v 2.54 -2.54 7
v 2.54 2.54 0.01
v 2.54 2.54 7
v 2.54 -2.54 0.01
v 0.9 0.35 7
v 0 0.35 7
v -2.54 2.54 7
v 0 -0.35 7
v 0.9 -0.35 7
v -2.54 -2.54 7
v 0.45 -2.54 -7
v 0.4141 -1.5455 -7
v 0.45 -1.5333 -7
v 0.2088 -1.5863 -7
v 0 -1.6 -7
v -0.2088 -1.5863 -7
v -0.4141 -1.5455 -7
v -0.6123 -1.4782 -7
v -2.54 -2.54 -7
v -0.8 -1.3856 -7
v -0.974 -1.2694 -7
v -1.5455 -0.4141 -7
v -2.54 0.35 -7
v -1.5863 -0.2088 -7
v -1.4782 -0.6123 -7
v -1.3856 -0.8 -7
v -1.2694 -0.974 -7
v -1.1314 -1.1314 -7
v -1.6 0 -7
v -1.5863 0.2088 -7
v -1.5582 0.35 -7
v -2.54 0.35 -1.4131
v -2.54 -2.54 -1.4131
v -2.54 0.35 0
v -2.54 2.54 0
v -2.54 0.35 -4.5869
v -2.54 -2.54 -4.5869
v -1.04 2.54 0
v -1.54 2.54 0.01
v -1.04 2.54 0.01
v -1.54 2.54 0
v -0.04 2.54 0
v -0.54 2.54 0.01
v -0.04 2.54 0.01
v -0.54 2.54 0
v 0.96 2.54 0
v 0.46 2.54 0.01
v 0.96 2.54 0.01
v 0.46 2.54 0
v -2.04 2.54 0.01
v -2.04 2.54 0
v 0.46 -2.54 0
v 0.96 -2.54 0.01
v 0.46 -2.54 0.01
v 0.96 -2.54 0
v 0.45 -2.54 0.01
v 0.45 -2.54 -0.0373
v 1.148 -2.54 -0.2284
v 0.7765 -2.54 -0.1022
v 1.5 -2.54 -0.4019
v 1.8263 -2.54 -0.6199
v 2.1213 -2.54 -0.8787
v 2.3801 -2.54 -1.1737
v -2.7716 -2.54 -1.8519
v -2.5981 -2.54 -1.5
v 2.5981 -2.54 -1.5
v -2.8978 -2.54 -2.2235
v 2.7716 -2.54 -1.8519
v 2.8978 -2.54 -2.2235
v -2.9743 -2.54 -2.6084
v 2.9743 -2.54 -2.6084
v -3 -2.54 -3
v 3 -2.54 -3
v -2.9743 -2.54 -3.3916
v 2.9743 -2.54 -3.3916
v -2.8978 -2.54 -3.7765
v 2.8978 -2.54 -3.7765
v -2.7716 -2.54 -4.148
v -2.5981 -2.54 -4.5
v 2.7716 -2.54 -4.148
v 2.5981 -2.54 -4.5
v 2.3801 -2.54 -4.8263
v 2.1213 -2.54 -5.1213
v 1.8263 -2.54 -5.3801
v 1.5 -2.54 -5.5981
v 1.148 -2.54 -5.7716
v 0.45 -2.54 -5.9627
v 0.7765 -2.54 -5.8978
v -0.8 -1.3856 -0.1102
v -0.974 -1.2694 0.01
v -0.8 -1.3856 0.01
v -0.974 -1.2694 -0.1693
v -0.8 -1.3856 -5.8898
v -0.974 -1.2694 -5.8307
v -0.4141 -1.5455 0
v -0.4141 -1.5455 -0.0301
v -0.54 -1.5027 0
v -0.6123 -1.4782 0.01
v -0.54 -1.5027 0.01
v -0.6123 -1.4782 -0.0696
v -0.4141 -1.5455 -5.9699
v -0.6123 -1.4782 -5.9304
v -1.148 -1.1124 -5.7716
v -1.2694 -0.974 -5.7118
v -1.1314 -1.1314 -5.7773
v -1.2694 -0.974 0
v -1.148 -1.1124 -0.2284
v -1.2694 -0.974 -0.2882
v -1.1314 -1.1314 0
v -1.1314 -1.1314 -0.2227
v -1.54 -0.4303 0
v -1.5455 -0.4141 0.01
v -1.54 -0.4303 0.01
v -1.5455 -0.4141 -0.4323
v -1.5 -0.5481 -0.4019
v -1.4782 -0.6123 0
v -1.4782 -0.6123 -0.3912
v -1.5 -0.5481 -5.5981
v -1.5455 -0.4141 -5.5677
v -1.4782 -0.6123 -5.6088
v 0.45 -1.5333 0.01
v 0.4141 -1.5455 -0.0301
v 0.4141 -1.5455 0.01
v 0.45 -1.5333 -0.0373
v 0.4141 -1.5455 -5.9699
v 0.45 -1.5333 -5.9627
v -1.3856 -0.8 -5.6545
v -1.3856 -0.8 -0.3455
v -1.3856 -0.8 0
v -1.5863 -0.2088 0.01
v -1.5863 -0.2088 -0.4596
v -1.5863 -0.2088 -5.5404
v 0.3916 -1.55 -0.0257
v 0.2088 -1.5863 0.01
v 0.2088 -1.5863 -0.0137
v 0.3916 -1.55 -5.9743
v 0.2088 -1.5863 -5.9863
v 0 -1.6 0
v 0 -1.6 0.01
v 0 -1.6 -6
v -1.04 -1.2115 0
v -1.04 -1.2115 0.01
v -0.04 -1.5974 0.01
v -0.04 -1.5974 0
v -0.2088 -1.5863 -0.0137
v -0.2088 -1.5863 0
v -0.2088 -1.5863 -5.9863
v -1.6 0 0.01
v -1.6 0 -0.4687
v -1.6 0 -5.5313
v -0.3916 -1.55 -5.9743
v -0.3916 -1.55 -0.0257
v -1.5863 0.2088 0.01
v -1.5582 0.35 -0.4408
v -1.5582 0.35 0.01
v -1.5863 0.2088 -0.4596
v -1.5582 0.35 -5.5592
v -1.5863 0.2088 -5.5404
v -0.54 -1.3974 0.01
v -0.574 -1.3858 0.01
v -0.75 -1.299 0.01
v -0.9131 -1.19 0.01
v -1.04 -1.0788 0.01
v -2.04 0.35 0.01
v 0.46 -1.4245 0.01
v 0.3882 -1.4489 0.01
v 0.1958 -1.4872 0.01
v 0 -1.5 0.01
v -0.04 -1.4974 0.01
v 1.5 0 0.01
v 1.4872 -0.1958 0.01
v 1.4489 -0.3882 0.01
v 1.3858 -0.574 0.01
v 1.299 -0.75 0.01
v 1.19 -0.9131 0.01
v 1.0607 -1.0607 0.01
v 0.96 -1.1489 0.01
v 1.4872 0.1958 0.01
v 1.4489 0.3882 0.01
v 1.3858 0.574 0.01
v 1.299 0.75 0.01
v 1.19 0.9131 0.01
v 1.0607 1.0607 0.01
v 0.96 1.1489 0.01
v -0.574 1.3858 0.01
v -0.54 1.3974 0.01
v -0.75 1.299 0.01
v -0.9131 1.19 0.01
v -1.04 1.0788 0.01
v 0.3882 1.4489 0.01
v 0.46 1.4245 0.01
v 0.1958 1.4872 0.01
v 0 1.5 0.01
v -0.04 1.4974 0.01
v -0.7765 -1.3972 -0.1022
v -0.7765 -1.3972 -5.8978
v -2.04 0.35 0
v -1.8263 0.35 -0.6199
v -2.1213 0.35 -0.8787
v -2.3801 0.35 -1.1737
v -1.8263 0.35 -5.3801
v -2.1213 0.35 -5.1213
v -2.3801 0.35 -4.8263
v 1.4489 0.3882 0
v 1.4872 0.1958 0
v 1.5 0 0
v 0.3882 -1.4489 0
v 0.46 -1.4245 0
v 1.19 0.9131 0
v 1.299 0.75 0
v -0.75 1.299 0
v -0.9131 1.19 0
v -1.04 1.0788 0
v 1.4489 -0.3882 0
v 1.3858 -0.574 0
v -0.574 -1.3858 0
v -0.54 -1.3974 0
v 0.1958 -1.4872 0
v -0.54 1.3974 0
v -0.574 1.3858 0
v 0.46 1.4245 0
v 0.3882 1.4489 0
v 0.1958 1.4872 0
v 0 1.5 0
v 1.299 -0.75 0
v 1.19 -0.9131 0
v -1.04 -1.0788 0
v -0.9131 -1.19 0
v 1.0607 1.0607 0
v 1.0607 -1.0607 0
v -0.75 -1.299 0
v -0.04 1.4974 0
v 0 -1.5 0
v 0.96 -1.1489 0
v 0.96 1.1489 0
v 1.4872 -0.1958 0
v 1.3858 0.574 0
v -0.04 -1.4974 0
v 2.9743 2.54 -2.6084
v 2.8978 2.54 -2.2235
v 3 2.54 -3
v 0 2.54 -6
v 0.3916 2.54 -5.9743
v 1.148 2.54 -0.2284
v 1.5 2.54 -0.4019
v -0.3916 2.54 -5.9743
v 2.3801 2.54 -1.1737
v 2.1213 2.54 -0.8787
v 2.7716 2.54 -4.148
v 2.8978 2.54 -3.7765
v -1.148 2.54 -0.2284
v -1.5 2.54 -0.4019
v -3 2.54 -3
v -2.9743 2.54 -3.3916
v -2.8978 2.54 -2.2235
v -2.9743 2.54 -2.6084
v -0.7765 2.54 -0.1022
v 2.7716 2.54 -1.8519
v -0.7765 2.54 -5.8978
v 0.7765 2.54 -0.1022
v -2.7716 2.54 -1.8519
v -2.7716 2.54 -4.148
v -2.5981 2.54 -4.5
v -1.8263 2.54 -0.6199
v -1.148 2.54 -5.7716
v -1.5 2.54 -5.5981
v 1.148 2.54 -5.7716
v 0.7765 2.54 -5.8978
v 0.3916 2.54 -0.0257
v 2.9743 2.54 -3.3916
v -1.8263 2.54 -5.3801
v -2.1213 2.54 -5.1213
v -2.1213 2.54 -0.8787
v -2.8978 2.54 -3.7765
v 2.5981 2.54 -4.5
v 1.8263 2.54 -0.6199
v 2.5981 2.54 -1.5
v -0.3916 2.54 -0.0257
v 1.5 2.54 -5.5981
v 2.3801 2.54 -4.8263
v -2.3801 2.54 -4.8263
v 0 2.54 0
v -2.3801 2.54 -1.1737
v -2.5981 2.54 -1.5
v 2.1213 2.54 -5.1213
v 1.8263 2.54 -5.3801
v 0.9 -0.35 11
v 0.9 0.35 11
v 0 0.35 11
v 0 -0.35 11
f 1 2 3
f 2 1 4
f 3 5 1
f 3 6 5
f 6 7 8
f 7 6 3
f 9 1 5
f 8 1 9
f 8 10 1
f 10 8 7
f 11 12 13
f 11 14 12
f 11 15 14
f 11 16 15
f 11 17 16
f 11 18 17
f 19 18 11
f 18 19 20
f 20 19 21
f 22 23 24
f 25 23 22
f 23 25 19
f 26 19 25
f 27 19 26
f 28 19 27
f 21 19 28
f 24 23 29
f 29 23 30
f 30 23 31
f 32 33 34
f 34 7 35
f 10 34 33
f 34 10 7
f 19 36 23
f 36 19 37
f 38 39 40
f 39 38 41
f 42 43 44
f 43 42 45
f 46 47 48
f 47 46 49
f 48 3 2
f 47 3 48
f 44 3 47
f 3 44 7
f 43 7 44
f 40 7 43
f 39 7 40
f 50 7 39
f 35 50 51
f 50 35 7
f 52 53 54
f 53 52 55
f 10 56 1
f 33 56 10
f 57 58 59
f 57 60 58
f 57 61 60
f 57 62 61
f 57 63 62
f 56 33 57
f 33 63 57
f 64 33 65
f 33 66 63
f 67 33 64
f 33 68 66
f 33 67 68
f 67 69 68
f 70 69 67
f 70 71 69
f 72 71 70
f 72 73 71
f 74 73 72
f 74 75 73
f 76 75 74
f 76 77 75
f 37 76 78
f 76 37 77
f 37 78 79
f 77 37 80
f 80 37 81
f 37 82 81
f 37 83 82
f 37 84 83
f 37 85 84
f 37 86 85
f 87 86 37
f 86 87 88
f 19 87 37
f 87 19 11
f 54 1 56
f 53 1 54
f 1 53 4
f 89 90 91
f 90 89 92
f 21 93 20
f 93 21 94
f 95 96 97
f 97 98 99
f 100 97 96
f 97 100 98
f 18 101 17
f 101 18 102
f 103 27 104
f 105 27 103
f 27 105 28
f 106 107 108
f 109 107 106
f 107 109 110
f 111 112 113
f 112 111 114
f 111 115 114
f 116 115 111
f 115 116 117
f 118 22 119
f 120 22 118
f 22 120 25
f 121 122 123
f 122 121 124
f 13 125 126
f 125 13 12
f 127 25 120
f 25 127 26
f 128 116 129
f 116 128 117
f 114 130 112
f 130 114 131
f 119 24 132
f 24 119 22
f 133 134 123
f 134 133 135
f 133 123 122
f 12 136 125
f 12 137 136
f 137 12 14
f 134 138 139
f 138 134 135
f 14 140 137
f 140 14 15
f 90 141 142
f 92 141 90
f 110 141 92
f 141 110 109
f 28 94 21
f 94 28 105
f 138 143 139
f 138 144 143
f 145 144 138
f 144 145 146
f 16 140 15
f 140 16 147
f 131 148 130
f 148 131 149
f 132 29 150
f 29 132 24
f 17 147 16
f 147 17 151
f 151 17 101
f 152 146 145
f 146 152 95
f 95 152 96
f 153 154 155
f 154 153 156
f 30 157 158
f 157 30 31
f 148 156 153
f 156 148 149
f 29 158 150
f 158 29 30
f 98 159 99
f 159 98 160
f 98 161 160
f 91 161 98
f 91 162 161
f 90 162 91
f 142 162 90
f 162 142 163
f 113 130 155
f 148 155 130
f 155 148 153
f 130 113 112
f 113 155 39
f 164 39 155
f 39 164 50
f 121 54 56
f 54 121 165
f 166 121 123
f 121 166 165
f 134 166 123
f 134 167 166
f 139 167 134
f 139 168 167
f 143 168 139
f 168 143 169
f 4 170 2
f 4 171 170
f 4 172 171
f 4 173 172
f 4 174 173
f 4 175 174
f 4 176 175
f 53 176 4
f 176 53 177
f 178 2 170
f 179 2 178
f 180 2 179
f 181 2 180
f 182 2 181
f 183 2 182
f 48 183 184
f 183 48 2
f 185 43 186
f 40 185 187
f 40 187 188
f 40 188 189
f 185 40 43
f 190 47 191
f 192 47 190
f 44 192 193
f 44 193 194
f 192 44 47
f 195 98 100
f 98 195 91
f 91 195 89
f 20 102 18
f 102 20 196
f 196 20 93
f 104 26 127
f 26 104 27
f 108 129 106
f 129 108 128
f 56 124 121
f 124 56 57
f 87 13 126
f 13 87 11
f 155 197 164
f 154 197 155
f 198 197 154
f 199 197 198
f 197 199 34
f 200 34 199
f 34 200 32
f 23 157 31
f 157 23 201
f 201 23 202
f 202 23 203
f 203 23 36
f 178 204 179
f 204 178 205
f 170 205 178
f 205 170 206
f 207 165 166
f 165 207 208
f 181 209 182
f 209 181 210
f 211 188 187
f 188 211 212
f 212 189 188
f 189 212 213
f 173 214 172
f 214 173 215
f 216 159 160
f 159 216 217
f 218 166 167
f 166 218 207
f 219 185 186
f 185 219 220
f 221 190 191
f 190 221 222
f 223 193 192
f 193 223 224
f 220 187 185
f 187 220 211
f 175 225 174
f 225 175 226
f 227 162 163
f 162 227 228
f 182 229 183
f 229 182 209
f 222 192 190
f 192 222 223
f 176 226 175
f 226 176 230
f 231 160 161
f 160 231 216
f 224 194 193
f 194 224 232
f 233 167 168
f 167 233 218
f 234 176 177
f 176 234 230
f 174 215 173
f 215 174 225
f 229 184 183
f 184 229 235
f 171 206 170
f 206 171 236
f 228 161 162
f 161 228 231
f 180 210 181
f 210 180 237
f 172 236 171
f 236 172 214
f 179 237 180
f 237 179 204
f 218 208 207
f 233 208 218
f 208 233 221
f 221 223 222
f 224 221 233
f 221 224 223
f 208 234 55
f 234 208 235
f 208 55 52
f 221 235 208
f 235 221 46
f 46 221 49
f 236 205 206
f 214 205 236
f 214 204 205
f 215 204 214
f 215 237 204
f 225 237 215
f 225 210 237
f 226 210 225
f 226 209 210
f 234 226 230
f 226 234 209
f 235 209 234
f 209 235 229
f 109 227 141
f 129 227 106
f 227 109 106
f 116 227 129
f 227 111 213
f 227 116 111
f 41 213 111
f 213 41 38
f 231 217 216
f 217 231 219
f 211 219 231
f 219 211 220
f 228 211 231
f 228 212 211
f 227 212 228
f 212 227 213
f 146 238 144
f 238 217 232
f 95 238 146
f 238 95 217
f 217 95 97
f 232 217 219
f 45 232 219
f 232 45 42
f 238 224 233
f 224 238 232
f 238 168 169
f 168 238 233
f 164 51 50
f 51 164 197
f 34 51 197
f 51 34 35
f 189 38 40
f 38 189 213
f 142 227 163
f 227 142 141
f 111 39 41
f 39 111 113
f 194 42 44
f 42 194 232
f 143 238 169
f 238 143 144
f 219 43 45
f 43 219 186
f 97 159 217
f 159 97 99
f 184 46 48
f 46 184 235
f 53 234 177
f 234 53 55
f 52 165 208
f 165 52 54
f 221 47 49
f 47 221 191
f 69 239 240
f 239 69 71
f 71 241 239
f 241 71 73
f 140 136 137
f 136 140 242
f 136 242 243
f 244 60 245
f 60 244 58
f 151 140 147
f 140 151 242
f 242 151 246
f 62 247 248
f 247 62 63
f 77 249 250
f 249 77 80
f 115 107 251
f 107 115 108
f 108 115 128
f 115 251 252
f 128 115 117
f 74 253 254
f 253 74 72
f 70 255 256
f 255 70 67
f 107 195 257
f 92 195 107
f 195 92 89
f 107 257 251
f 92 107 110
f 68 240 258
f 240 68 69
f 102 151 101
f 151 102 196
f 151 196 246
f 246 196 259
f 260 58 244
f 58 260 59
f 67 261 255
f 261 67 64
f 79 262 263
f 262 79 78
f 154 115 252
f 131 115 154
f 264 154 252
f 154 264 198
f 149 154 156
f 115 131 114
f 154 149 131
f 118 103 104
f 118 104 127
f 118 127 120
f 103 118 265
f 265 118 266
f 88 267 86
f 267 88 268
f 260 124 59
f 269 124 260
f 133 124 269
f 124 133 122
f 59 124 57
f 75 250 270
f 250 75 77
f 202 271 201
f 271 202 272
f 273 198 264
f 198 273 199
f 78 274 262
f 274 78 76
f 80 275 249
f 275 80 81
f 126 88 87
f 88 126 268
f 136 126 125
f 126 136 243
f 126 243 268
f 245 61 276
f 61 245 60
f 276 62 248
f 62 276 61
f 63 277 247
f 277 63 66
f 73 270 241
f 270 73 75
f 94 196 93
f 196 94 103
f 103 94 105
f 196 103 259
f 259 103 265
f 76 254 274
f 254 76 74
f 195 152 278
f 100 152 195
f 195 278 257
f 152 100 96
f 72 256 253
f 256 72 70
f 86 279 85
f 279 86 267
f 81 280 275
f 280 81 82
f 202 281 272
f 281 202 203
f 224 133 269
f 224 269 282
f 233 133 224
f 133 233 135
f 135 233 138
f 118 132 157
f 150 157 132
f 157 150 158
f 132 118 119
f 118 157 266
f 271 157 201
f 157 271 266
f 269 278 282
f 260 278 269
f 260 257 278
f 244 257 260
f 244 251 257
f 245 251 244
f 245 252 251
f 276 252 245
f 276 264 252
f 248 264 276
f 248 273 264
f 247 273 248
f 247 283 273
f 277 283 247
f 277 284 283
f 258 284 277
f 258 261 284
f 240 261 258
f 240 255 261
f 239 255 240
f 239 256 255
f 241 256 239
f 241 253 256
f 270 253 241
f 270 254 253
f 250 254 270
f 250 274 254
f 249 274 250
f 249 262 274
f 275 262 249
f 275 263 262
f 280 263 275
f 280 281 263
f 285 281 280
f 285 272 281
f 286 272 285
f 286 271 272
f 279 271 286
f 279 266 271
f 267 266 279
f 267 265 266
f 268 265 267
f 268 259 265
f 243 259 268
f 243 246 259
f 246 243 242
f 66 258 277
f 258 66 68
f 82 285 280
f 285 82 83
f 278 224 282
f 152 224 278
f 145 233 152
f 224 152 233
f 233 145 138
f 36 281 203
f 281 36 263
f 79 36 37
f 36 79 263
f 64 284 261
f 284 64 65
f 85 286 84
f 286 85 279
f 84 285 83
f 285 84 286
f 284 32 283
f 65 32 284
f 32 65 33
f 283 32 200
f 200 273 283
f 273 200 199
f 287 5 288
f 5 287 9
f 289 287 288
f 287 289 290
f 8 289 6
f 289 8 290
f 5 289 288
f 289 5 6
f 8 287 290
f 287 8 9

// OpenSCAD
// DND-72 ultra-low-cost S5-R variant -- CAD evidence for the unit cell and the
// R=6 / 20-writer low-cost bank geometry.
//
// This is a SINGLE-COLUMN unit cell of the unchanged S5-R register mechanism,
// re-rendered for the low-cost variant's design point, plus the R=6 deep bank
// cross-section that the exhaustive cost scan selects as the cheapest
// requirement-preserving configuration (R6-W20-M2, $345.90 delivered,
// 29.987 s). Its job is to let the sourced analytic printability gate read the
// declared feature sizes and to let a real OpenSCAD render + mesh-validate that
// the cell + bank geometry is a closed solid at the 5.08 mm pitch.
//
// IMPORTANT: this variant does NOT change the mechanism. The DND-72 finding is
// that the S5-R FIXED BASE alone ($218.70 parts -> $253.69 delivered) exceeds
// the $250 purchased target, so no mechanism cost-engineering can reach the
// target under the unchanged mission requirements. The CAD here is the cell of
// the cheapest requirement-preserving point, kept identical to the promoted
// geometry because that geometry is already the minimum for the gates.
//
// The constants below are parsed by tools/validate/analytic_printability.py
// (via tools/lowcost_analytic_printability.py) and recomputed by s5r_ultra.py.
// Keep them in sync.
//
// EVIDENCE CLASS: CAD (this file + its STL render). Not a print, not a
// measurement. See 07-evidence-and-decisions/dnd72-low-cost-variant.md.
//
// Units: mm. Target process: Bambu X1C, PLA, 0.4 mm nozzle (tools/fdm-limits).

// ==== cell geometry (unchanged S5-R; the DND-59 re-profile) ================
PITCH = 5.08;
ROTOR_RADIUS = 1.5;
ROTOR_CORE_RADIUS = 1.0;
BASE = 2.0;
LEVELS = 5;
LEVEL_ANGLE = 360 / LEVELS;     // 72 deg

// printed drive pawl (vertical cantilever, load-bearing = 2 lines)
PAWL_T = 0.90;                  // thickness in X (pitch direction); 2 lines
PAWL_W = 0.70;                  // width in Y (row direction)
PAWL_LEN = 8.00;                // Z extent of the cantilever
PAWL_DEFLECT = 0.10;            // working deflection off the rack tooth

// keeper latch (DND-59 re-profile: 2 lines + hard compression shoulder)
KEEPER_T = 0.90;               // thickness in Y (2 lines; PASS)
KEEPER_W = 0.70;
KEEPER_LEN = 4.00;
KEEPER_OVER_CENTRE = 0.06;
KEEPER_GATE_STEP = 0.35;
KEEPER_SHOULDER_X = 0.50;

// shared drive bar with rack (DND-58: pitch 1.00 / tooth 0.50, sourced rod d=6)
RACK_TOOTH_PITCH = 1.00;
RACK_TOOTH_HEIGHT = 0.50;
BAR_D = 6.0;                    // sourced steel drive rod d=6
BAR_H = BAR_D;
BAR_W = PITCH;                  // one column of the real 80-wide bar

// housing
CELL_H = 7.0;
WALL = 0.90;
SLOT_CLEAR = 0.15;
ROTOR_BORE_CLEAR = 0.40;

// ---- DND-72 low-cost design point (the cheapest <30 s configuration) ------
ROWS_IN_BANK = 6;               // R=6 bank depth (no pitch penalty)
WRITERS = 20;                   // 20 writer solenoids over 480 cells/group
BANK_MOTORS = 2;                // 2 bank motors drive the shared rod

$fn = 48;
EPS = 0.01;

module rotor() {
    cylinder(r = ROTOR_RADIUS, h = BASE);
    translate([0, 0, BASE]) cylinder(r = ROTOR_CORE_RADIUS, h = CELL_H - BASE);
}

module pawl() {
    translate([0, -PAWL_W / 2, 0]) cube([PAWL_T, PAWL_W, PAWL_LEN]);
}

module keeper() {
    // keeper re-profiled into the ROW (Y) direction, beside the pawl (DND-59)
    translate([0, PAWL_W + KEEPER_OVER_CENTRE, 0])
        cube([KEEPER_T, KEEPER_T, KEEPER_LEN]);
    for (k = [0:LEVELS - 1])
        translate([0, PAWL_W + KEEPER_OVER_CENTRE + KEEPER_T,
                   k * KEEPER_GATE_STEP])
            cube([KEEPER_T, 0.20, 0.15]);
    // hard printed shoulder: pawl push-out taken in COMPRESSION
    translate([0, PAWL_W + KEEPER_OVER_CENTRE, -KEEPER_SHOULDER_X])
        cube([KEEPER_T, KEEPER_SHOULDER_X, KEEPER_SHOULDER_X]);
}

module drive_bar() {
    // sourced steel rod d=6, modelled round; rack teeth 1.00/0.50
    translate([0, 0, -BAR_H / 2]) rotate([90, 0, 0])
        cylinder(r = BAR_D / 2, h = BAR_W, center = true);
    for (t = [0:3])
        translate([-BAR_W / 2 + t * RACK_TOOTH_PITCH, -BAR_W / 2, 0])
            cube([RACK_TOOTH_HEIGHT, BAR_W, RACK_TOOTH_HEIGHT]);
}

module cell() {
    difference() {
        translate([-PITCH / 2, -PITCH / 2, -BAR_H - 1])
            cube([PITCH, PITCH, CELL_H + BAR_H + 1]);
        translate([0, 0, -BAR_H - 1 - EPS]) cylinder(r = ROTOR_RADIUS + 0.10,
                                                     h = CELL_H + 2 * EPS);
        translate([PAWL_T / 2, -PITCH / 2 - EPS, -BAR_H - 1 - EPS])
            cube([PITCH / 2, PITCH + 2 * EPS, CELL_H + 2 * EPS]);
        translate([-PITCH / 2 - EPS, PAWL_W / 2, -BAR_H - 1 - EPS])
            cube([PITCH + 2 * EPS, PITCH / 2, CELL_H + 2 * EPS]);
    }
}

module unit_cell_assembly() {
    cell();
    rotor();
    translate([0, 0, BASE + 1]) pawl();
    translate([0, 0, BASE + 1]) keeper();
    drive_bar();
}

// The R=6 bank cross-section: 6 rows of the cell share ONE racked drive rod.
// This is the geometry that lets 6 rows be written per bank pass with no pitch
// penalty (row pitch == column pitch == 5.08 mm). Rendered as a small 6-row
// witness to keep the CAD render bounded; the real bank is 80 columns wide.
module bank_cross_section() {
    for (r = [0:ROWS_IN_BANK - 1])
        translate([0, r * PITCH, 0]) unit_cell_assembly();
}

part = "assembly";

if (part == "assembly") {
    unit_cell_assembly();
} else if (part == "bank") {
    bank_cross_section();
} else if (part == "cell") {
    cell();
} else if (part == "pawl") {
    pawl();
} else if (part == "keeper") {
    keeper();
}
